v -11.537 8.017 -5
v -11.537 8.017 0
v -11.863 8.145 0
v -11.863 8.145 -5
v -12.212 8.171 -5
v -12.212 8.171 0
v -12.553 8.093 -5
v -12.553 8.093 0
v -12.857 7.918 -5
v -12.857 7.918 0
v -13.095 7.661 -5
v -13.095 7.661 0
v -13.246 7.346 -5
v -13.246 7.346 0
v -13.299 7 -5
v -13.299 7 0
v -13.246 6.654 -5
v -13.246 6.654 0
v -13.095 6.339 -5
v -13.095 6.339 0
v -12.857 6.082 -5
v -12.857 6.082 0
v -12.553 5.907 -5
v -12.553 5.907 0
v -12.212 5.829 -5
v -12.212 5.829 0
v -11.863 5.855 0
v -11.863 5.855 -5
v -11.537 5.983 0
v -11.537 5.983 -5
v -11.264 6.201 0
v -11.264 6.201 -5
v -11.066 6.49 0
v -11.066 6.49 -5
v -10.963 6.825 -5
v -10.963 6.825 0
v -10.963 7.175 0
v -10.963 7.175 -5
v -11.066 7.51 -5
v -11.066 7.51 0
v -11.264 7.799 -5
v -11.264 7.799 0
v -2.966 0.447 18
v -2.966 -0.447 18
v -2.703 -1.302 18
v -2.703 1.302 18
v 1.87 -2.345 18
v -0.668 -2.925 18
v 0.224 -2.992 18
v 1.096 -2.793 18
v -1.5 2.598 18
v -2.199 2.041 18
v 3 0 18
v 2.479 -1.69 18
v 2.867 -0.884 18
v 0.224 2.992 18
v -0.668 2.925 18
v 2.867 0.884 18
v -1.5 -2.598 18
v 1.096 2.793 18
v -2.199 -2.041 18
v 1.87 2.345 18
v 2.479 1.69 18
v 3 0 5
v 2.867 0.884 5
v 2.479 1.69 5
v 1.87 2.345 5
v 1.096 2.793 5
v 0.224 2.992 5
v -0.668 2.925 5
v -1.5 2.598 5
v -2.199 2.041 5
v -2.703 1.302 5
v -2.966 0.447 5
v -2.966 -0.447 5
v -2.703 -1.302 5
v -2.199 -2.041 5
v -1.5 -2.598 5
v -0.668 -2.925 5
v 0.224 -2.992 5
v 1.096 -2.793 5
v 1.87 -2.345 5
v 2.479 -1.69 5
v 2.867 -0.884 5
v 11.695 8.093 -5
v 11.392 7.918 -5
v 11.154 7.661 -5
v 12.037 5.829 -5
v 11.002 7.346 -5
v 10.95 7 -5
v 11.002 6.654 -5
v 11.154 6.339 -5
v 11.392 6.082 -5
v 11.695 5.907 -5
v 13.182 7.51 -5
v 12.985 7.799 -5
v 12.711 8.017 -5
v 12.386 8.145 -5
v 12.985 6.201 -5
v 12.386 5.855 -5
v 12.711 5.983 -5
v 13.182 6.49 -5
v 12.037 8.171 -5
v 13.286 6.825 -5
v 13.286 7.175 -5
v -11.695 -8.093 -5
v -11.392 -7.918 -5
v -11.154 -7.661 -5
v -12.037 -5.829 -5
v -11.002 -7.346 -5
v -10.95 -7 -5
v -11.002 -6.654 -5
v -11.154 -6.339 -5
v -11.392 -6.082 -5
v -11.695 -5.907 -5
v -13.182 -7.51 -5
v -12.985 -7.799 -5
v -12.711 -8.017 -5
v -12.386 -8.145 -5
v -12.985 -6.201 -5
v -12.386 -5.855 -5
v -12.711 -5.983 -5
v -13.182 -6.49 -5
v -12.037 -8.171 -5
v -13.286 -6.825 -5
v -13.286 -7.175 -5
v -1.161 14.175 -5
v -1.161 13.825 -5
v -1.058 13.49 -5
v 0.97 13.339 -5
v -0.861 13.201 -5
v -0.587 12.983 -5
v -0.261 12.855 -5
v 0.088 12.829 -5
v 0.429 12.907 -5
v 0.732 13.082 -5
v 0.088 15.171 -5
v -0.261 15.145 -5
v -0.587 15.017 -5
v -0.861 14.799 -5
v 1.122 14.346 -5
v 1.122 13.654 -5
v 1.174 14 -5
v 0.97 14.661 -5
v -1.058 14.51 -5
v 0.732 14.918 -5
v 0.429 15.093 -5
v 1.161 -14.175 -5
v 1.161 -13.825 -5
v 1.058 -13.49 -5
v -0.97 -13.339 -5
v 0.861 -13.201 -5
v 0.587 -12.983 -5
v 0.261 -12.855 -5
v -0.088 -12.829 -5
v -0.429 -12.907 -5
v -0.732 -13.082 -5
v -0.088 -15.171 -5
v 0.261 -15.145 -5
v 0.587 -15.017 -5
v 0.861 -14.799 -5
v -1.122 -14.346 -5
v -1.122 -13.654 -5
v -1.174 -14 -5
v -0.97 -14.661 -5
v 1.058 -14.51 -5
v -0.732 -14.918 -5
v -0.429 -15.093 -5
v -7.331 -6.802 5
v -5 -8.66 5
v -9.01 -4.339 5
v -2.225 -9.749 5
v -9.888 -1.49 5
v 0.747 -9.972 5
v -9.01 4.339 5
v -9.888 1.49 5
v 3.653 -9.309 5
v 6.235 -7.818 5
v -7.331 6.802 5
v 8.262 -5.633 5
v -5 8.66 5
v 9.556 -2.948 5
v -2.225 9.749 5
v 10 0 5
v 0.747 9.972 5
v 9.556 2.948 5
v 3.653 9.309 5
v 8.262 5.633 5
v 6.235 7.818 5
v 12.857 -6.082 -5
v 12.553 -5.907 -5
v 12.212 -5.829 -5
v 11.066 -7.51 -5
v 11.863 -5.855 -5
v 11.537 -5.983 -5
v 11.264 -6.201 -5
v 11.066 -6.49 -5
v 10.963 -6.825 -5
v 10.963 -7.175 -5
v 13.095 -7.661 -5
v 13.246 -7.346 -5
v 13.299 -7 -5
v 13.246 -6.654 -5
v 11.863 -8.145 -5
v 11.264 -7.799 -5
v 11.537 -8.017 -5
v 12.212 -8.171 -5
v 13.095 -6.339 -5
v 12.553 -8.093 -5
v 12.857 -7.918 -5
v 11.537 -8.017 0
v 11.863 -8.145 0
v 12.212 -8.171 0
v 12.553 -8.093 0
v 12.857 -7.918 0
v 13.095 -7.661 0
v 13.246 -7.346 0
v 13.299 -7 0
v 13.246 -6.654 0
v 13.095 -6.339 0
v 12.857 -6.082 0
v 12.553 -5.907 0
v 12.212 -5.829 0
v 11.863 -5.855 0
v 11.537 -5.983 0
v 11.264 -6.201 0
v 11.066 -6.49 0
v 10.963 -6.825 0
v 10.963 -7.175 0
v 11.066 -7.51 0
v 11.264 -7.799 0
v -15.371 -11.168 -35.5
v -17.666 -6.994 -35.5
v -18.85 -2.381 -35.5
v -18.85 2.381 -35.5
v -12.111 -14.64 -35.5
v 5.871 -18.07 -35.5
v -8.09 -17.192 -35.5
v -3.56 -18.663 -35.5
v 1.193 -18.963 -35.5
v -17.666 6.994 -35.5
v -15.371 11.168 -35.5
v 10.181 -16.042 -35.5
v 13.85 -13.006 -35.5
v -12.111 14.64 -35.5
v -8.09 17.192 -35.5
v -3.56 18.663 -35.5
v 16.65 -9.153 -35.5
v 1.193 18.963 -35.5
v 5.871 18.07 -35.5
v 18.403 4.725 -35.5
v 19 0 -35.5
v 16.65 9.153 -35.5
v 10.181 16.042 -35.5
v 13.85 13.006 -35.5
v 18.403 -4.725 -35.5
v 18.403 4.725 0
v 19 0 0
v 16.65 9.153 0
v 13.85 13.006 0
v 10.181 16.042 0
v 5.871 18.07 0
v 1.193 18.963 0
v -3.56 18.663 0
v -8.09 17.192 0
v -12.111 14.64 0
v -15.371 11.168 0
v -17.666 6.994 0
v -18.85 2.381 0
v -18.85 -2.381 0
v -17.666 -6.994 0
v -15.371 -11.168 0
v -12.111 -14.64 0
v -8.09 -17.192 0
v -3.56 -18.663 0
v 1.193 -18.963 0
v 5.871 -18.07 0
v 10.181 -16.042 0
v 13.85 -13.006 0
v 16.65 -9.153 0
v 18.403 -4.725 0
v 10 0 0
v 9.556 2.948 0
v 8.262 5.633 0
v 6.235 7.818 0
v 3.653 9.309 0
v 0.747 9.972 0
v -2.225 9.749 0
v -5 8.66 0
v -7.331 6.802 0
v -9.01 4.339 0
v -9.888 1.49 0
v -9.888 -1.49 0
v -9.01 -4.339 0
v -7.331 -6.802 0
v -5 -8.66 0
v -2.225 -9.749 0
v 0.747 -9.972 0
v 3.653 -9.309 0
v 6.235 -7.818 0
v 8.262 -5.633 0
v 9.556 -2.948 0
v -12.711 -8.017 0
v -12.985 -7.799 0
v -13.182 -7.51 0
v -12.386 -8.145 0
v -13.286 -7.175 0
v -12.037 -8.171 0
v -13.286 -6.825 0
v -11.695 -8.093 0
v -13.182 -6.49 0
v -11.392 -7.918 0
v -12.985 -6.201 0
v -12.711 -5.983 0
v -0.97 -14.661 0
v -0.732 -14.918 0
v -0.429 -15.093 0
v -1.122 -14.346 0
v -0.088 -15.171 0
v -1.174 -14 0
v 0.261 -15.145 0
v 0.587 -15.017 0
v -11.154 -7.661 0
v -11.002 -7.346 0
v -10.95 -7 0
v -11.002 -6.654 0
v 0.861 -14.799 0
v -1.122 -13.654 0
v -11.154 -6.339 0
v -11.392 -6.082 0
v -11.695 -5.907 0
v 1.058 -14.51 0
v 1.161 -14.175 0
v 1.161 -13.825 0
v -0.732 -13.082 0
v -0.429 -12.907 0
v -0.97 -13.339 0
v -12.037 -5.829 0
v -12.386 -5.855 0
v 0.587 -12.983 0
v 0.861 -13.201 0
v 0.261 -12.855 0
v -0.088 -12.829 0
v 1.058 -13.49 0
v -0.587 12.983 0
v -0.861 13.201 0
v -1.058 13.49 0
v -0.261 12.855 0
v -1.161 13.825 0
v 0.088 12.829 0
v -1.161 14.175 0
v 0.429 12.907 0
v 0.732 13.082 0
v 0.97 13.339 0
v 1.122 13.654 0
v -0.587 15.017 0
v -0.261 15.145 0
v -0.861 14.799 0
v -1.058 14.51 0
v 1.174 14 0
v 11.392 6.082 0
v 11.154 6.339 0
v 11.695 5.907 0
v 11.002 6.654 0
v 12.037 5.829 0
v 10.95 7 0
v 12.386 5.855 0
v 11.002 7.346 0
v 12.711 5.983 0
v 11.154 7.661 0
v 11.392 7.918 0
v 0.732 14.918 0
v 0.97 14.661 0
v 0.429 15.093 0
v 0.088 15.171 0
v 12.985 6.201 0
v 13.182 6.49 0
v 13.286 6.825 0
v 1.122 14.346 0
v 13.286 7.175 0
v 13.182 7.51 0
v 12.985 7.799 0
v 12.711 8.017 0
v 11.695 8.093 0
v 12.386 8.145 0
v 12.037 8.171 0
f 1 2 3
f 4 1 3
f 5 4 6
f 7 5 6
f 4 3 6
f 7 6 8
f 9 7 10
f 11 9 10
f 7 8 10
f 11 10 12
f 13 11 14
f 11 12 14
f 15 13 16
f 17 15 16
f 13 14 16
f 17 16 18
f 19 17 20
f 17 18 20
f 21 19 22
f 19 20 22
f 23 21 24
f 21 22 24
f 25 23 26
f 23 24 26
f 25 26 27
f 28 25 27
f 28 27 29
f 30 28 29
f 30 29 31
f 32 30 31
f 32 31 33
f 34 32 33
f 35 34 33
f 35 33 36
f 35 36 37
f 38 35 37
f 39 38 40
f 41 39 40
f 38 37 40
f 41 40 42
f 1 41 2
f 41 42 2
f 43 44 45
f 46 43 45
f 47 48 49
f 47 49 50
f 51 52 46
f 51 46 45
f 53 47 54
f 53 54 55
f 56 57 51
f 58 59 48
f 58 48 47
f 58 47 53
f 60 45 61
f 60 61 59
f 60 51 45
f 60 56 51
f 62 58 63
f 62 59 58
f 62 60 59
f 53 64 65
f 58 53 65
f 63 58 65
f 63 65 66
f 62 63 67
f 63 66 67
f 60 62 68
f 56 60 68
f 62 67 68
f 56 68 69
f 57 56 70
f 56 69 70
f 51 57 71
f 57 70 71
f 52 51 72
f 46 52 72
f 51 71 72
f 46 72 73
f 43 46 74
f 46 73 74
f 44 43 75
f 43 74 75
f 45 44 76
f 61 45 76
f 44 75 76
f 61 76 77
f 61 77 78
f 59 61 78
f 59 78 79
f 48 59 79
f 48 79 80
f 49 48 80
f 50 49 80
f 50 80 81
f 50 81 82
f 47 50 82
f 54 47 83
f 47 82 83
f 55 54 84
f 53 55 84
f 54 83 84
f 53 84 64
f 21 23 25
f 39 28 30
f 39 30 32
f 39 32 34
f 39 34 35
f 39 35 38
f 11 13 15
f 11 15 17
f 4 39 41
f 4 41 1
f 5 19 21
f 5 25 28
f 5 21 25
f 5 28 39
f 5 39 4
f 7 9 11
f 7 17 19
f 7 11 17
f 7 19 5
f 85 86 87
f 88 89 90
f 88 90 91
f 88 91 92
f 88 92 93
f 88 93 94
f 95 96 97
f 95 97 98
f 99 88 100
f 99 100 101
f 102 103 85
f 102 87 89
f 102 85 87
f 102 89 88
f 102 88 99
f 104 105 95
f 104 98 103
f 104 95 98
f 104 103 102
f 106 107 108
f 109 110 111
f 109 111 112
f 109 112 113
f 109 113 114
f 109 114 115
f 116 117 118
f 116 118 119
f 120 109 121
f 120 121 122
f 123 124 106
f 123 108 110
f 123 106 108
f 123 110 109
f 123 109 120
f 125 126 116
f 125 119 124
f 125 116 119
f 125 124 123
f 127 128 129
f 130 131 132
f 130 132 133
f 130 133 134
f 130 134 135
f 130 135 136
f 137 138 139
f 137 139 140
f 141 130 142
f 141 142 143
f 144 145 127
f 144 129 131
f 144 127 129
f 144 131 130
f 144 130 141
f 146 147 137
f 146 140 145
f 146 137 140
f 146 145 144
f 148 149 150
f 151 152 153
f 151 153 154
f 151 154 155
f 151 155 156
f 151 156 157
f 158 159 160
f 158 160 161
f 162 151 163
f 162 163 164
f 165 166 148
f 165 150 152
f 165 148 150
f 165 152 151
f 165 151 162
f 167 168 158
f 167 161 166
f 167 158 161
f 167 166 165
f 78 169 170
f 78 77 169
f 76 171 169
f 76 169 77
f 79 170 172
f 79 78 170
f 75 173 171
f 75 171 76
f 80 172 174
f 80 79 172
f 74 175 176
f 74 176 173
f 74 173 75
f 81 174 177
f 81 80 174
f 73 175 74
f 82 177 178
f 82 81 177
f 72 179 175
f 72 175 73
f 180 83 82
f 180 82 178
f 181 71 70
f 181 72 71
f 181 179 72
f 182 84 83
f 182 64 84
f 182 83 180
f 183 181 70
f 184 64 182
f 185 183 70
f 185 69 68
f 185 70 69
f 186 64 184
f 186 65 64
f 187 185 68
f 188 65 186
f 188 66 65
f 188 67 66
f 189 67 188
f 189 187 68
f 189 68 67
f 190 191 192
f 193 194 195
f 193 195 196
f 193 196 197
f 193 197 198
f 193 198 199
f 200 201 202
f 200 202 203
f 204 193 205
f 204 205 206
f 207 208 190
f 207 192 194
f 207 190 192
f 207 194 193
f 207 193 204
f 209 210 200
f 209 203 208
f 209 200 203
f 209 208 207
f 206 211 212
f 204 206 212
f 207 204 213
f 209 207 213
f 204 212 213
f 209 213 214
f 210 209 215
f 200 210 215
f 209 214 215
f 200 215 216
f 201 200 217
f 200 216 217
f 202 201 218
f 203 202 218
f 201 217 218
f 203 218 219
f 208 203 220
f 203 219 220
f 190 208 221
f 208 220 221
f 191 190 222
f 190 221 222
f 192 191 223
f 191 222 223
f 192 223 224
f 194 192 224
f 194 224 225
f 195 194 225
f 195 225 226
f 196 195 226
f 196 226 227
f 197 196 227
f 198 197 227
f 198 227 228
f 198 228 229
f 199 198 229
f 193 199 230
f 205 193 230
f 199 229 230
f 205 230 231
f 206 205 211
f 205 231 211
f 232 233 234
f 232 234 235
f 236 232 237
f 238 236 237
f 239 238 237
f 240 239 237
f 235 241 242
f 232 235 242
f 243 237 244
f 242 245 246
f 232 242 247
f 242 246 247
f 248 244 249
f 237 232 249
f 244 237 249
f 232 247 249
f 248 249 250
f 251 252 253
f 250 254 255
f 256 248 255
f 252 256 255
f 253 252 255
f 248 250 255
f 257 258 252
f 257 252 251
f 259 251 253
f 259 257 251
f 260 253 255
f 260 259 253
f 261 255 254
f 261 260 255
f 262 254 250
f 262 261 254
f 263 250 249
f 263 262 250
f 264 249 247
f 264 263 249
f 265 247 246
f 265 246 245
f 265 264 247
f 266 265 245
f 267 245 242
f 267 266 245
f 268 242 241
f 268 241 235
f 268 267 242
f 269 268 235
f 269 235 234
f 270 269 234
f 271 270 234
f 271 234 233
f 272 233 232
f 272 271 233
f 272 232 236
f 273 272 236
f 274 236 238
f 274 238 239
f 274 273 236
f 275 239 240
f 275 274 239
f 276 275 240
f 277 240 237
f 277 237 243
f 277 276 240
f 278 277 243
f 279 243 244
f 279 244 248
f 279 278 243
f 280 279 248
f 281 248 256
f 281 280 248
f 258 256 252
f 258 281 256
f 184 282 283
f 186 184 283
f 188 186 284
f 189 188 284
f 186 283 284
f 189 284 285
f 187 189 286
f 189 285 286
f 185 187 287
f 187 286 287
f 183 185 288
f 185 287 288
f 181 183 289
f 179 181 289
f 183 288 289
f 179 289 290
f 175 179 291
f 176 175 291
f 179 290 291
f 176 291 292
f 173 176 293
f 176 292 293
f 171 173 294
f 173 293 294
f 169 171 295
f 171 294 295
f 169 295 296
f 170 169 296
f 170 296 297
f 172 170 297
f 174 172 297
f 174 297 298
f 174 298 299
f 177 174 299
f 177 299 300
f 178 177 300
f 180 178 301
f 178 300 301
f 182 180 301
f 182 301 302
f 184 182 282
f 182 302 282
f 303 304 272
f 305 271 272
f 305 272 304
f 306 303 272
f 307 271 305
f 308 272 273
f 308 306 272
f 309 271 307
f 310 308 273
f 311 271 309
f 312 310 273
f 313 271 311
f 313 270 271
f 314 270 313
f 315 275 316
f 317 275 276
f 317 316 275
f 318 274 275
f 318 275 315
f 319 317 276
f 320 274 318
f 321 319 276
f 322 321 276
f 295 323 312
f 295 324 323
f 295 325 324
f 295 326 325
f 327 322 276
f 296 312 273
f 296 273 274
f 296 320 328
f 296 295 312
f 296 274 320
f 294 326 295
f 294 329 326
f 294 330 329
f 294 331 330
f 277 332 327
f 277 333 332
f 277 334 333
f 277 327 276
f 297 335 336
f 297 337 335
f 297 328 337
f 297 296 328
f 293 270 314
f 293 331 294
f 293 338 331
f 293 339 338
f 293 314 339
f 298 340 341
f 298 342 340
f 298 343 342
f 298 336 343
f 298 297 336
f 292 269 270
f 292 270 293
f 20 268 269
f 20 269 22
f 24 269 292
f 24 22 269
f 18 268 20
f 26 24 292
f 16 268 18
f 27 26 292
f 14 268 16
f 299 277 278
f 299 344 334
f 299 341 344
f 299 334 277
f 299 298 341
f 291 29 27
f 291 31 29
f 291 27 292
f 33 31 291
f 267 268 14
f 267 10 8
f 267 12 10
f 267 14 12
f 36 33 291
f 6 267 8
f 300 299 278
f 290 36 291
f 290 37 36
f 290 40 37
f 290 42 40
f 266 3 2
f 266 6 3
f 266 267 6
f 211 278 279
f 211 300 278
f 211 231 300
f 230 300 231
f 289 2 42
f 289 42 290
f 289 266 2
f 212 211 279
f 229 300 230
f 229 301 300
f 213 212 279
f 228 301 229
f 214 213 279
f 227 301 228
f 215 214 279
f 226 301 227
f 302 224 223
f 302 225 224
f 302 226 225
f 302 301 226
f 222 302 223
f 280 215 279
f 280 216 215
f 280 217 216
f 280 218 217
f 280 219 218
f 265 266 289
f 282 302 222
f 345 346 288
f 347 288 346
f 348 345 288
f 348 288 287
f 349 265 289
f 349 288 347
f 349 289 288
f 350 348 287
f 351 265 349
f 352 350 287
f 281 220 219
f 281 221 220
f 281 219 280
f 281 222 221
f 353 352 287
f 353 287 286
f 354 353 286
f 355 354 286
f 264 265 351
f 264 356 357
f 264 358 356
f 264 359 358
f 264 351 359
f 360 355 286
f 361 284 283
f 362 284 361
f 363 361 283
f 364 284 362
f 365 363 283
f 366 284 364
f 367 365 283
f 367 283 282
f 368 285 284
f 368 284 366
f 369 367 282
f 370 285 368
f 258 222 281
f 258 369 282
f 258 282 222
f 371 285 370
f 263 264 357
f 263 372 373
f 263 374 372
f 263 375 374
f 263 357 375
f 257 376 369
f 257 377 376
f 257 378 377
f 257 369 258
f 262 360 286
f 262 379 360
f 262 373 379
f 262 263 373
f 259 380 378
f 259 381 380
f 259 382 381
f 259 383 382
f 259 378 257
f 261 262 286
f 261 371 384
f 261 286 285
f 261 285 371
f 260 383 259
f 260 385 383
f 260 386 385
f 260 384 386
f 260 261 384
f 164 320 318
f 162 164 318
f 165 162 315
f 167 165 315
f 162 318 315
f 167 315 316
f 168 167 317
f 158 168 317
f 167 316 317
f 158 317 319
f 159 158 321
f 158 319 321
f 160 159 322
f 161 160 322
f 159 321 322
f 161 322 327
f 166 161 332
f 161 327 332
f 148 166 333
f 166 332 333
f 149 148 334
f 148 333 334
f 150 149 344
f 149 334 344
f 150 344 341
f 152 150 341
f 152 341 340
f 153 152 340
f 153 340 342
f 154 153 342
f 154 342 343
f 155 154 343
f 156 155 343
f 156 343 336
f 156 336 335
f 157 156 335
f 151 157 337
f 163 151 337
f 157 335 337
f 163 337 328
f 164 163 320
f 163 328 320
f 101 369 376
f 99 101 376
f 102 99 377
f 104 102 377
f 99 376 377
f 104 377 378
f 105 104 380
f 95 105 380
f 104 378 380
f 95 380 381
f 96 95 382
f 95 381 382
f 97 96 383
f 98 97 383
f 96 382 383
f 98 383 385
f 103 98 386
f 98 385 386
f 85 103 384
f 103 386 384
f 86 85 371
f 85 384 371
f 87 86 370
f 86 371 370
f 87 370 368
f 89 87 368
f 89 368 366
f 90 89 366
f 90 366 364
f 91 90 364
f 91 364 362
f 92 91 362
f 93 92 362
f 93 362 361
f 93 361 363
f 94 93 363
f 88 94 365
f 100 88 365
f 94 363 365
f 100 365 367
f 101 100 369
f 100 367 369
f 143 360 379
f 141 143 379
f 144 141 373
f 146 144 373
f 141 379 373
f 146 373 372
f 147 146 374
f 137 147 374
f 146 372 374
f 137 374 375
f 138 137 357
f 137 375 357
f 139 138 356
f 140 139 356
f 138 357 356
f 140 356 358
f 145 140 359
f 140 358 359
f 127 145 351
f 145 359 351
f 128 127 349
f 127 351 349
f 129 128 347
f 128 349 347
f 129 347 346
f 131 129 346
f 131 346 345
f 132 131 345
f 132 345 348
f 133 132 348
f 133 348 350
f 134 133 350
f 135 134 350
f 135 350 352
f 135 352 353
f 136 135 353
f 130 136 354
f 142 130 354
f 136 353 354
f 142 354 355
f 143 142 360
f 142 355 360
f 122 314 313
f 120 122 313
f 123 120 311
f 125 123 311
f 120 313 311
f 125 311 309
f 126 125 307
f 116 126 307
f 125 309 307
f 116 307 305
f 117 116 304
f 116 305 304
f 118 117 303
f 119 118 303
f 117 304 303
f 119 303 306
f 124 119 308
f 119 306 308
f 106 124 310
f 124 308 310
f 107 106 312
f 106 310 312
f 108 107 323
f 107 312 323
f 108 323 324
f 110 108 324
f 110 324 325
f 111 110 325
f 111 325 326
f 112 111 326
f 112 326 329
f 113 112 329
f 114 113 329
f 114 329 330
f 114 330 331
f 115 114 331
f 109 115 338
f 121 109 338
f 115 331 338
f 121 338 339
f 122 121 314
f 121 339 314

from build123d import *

# Parameters (mm, degrees)
SKETCH1_R           = 19
BOSS_EXTRUDE1_DEPTH = 35.5
SKETCH2_R           = 10
BOSS_EXTRUDE2_DEPTH = 5
SKETCH3_R           = 3
BOSS_EXTRUDE3_DEPTH = 13
SKETCH4_R           = 1.174286688
CUT_EXTRUDE1_DEPTH  = 5
CIRPATTERN1_COUNT   = 6


with BuildPart() as part:
    # Sketch1 → Boss-Extrude1 (new body)
    with BuildSketch(Plane.XY):
        Circle(SKETCH1_R)
    extrude(amount=-BOSS_EXTRUDE1_DEPTH)

    # Sketch2 → Boss-Extrude2 (add)
    with BuildSketch(Plane.XY):
        Circle(SKETCH2_R)
    extrude(amount=BOSS_EXTRUDE2_DEPTH)

    # Sketch3 → Boss-Extrude3 (add)
    with BuildSketch(Plane.XY.offset(5)):
        Circle(SKETCH3_R)
    extrude(amount=BOSS_EXTRUDE3_DEPTH)

    # Sketch4 → Cut-Extrude1 (cut)
    with BuildSketch(Plane.XY):
        with Locations((0, 14)):
            Circle(SKETCH4_R)
    cut_extrude1 = extrude(amount=-CUT_EXTRUDE1_DEPTH, mode=Mode.SUBTRACT)

    # CirPattern1: Cut-Extrude1 ×6 about axis
    cirpattern1_axis = Axis((0, 0, 0), (0, 0, 1))
    for i in range(1, CIRPATTERN1_COUNT):
        add(cut_extrude1.rotate(cirpattern1_axis, i * 360 / CIRPATTERN1_COUNT), mode=Mode.SUBTRACT)


solid = part.part
